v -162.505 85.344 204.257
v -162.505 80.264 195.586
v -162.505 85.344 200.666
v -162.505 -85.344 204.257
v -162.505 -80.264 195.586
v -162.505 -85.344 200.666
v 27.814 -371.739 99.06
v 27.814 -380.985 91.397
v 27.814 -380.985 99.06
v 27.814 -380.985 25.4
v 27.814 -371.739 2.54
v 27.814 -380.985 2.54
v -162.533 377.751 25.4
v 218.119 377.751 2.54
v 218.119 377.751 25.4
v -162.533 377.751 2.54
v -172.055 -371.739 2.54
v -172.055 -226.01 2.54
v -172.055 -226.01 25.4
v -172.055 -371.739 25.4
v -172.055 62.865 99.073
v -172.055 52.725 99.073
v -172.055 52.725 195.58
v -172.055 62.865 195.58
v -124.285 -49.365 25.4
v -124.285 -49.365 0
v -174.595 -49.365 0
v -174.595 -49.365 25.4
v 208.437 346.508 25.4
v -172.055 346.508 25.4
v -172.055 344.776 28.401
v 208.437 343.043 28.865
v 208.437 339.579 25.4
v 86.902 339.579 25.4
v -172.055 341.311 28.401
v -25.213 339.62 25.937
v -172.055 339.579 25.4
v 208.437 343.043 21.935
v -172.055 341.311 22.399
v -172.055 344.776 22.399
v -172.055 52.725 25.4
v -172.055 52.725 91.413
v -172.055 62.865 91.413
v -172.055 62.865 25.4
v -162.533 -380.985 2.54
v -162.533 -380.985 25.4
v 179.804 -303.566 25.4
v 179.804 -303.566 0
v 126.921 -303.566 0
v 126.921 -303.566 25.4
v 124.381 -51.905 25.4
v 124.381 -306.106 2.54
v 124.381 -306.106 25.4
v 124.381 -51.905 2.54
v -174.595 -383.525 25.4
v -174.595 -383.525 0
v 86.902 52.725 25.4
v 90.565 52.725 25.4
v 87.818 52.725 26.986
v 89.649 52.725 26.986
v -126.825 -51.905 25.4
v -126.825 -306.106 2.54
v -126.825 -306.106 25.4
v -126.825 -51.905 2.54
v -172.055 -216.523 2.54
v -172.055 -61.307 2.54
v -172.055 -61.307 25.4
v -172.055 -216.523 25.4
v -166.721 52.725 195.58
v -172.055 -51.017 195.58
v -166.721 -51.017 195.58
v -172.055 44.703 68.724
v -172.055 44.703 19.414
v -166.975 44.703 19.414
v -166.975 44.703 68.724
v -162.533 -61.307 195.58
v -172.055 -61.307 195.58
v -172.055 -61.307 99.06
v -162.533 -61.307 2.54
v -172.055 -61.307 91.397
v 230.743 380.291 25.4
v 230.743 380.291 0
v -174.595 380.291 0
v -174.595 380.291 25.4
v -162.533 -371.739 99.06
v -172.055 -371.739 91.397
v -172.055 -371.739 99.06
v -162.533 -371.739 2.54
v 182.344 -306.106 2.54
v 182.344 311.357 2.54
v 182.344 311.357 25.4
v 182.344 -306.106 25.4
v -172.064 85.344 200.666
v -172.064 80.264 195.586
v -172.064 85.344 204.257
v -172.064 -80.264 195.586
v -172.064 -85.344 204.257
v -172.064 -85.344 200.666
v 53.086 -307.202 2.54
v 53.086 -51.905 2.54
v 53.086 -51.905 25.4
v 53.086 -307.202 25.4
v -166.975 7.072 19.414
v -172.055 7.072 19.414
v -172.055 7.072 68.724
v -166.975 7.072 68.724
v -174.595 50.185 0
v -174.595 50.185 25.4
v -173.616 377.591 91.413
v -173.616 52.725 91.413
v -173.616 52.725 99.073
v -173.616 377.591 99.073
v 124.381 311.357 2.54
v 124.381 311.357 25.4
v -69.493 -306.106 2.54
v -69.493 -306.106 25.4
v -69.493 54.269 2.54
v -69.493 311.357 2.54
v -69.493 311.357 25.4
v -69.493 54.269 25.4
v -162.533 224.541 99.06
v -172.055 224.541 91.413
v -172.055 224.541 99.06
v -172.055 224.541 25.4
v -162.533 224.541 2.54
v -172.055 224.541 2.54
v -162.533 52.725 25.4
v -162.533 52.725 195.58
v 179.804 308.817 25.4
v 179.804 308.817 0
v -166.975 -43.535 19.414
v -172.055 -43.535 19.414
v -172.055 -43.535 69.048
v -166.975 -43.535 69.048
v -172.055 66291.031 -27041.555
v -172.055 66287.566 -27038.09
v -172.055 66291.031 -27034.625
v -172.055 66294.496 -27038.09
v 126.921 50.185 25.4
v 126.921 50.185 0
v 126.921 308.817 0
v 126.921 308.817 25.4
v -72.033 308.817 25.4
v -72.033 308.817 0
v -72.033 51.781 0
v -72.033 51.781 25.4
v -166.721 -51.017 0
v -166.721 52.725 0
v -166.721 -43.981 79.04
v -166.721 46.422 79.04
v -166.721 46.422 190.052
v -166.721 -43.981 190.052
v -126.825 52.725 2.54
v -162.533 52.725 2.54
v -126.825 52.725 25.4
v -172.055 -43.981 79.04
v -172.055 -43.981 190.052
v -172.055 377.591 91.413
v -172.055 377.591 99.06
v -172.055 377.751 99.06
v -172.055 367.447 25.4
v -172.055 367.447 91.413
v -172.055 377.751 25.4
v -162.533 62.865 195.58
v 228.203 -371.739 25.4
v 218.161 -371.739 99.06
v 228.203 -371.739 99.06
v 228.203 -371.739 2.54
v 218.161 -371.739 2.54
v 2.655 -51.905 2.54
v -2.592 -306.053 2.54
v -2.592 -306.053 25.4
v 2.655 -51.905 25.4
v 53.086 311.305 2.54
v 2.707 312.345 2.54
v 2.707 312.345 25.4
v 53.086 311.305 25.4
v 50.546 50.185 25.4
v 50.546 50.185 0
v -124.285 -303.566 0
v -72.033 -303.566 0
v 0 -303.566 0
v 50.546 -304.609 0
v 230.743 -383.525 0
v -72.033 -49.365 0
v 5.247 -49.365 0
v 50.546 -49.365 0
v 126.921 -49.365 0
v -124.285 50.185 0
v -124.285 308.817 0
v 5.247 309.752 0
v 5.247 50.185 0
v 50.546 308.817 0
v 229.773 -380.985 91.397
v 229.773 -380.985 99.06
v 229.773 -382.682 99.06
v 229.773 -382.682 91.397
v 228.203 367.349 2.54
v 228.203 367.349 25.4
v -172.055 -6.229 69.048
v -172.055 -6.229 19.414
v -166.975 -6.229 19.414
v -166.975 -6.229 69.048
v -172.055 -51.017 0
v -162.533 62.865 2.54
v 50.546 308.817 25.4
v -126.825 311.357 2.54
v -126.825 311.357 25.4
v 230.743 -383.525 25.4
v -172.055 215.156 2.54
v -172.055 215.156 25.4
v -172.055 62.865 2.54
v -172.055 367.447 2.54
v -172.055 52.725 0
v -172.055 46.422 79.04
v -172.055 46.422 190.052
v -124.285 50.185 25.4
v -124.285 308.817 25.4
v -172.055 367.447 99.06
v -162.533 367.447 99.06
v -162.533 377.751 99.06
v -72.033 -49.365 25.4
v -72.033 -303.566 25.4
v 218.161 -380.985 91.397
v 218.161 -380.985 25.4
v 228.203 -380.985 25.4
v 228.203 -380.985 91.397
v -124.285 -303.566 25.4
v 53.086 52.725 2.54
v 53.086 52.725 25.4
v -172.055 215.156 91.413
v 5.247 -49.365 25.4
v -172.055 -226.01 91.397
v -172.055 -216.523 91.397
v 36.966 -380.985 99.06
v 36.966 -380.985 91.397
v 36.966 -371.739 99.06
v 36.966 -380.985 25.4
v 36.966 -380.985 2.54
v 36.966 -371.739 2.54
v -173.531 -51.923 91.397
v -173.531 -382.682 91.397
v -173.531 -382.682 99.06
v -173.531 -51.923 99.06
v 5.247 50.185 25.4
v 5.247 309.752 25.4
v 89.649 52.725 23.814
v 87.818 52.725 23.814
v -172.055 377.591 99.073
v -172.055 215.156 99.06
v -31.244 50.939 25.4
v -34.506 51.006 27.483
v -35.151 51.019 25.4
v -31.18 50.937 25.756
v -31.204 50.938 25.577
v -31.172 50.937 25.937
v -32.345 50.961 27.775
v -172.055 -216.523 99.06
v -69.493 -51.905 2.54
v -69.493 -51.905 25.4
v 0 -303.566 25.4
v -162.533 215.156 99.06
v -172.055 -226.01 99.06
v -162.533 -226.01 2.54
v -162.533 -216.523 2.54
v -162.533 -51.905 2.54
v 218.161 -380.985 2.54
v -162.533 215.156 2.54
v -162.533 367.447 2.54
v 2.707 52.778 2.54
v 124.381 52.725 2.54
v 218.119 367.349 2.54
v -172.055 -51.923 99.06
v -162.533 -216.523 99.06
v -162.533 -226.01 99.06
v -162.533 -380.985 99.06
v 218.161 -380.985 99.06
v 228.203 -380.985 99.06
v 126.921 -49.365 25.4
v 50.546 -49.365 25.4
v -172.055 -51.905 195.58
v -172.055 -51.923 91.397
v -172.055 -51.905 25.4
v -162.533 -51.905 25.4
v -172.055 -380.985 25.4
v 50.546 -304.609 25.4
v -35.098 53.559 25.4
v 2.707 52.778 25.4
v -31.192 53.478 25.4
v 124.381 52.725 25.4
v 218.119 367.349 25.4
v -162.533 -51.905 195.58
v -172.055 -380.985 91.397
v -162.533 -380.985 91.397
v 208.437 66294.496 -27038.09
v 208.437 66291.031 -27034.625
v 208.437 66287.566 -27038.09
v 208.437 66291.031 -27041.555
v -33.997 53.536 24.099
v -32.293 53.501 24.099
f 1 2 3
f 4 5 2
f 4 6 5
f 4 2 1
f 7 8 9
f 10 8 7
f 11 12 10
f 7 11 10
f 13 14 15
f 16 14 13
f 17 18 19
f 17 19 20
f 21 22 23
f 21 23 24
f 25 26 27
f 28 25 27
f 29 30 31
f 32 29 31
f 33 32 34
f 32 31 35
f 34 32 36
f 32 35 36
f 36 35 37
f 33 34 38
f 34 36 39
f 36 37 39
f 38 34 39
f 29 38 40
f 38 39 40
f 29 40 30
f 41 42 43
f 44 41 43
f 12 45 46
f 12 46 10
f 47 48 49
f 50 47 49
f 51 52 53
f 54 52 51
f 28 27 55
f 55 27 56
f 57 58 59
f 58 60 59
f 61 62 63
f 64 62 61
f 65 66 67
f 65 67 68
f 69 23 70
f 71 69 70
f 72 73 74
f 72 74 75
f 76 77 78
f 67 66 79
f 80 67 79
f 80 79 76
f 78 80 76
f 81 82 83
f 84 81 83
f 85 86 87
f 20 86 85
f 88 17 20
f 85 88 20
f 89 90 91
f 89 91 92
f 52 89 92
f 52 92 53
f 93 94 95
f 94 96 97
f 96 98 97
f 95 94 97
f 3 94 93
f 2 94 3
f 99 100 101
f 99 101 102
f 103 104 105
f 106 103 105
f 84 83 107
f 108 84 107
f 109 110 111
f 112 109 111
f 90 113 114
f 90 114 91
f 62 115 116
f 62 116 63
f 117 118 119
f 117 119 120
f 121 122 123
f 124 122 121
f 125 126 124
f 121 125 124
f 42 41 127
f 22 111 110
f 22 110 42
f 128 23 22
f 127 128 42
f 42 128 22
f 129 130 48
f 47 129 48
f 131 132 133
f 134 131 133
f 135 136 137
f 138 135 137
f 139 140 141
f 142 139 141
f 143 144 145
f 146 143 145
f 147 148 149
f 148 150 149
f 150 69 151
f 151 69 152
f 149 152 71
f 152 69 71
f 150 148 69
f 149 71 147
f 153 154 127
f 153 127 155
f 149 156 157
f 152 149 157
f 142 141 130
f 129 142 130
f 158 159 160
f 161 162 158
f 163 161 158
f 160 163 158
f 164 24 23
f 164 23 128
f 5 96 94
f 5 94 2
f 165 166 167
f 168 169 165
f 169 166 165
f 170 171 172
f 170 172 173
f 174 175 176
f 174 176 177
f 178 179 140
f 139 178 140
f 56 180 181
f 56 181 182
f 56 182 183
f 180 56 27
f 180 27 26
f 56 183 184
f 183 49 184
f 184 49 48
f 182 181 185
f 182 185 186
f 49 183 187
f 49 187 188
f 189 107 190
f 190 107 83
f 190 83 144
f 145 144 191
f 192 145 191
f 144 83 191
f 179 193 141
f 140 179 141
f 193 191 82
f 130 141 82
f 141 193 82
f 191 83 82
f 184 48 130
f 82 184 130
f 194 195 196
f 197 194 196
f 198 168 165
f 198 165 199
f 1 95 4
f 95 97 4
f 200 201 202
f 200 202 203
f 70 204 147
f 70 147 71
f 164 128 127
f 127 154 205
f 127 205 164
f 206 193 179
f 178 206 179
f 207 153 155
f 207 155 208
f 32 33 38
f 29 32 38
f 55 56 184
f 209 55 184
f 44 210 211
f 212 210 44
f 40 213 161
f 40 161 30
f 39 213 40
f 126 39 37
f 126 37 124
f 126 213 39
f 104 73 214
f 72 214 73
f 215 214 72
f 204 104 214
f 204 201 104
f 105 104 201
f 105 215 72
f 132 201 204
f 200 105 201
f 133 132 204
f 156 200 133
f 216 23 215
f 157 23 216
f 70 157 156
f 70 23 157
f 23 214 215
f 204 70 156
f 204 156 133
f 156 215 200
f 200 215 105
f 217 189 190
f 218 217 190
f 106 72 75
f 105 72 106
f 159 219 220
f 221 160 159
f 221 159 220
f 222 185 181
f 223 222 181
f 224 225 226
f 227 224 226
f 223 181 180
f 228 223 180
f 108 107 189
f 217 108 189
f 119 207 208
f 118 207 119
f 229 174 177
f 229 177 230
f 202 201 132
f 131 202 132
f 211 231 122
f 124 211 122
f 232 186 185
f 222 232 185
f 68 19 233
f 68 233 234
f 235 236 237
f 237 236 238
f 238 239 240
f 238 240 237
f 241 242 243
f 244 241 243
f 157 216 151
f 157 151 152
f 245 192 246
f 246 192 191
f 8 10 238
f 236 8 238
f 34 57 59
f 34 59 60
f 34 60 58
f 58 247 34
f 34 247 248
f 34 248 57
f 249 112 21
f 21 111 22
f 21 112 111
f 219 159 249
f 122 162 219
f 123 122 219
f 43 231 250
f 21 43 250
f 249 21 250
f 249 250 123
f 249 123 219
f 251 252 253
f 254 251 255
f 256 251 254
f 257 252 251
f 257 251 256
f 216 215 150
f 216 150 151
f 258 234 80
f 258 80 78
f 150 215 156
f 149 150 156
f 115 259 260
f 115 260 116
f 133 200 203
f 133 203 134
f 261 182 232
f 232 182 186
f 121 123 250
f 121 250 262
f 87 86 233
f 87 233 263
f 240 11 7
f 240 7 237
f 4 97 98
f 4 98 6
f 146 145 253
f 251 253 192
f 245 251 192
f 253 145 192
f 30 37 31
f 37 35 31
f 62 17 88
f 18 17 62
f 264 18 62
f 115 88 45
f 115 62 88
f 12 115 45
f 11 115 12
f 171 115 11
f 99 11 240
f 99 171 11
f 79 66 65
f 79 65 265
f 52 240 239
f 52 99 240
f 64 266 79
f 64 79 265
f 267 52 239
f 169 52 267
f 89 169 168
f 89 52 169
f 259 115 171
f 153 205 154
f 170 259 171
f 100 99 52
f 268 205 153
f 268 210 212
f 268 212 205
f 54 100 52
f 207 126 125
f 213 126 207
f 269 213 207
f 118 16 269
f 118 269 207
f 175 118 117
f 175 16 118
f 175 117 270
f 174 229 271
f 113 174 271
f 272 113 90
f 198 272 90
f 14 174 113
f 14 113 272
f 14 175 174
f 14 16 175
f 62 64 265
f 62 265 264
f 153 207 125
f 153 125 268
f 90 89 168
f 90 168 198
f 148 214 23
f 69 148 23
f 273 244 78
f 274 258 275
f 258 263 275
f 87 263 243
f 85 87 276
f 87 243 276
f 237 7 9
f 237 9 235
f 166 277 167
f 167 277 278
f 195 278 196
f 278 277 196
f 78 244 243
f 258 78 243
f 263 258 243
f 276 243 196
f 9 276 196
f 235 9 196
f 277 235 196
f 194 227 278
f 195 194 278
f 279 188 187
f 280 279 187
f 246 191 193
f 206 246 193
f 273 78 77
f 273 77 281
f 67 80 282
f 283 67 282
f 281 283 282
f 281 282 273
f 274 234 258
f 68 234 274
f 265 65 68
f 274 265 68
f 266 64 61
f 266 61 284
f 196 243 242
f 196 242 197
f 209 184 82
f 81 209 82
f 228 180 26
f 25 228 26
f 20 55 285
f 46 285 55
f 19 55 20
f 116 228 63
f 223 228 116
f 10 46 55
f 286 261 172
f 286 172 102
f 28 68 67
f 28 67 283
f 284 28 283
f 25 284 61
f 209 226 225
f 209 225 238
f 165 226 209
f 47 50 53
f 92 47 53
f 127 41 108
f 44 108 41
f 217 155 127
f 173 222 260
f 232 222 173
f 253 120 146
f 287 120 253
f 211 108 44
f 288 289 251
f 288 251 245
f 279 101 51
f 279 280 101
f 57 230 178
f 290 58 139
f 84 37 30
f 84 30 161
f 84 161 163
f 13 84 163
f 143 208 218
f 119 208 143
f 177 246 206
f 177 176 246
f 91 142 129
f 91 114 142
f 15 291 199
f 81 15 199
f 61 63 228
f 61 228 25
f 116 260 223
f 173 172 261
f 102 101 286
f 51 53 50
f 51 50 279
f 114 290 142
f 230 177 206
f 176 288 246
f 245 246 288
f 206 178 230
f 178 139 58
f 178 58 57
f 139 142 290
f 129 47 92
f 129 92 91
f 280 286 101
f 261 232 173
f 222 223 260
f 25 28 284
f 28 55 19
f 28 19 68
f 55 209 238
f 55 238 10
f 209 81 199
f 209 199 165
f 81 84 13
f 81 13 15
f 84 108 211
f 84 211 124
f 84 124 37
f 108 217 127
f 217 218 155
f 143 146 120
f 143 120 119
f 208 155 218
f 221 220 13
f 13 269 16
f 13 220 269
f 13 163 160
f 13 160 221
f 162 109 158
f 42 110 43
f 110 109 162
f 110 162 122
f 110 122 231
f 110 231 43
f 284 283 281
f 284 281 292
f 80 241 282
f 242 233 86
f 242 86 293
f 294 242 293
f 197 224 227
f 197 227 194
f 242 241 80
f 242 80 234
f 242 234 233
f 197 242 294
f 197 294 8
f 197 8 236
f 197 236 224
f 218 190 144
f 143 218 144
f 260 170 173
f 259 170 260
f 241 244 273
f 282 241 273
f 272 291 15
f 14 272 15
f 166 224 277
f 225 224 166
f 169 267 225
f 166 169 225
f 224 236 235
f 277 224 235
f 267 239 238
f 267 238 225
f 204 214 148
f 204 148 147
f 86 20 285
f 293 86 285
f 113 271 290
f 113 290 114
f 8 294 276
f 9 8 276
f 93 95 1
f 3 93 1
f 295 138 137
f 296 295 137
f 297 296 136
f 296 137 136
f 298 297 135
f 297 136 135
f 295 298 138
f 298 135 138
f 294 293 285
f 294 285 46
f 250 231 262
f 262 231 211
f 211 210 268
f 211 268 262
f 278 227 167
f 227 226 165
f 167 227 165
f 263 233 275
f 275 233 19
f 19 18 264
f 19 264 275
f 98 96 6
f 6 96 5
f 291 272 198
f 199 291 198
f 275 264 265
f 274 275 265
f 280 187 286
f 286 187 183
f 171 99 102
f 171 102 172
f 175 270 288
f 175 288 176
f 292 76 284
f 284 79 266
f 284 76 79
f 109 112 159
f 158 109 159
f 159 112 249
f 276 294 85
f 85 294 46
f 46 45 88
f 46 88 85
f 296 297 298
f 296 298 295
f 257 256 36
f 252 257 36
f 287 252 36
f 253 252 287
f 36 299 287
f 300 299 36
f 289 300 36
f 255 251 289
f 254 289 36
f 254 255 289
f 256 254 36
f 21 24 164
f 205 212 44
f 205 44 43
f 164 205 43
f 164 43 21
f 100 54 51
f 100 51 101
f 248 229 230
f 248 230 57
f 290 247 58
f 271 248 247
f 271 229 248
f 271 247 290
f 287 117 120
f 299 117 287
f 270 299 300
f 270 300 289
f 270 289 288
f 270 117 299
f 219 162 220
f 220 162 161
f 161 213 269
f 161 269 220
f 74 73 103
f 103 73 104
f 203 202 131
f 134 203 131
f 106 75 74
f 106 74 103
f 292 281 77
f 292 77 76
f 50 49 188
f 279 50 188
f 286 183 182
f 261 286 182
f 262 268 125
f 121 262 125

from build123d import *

# Parameters (mm, degrees)
F1_DEPTH  = 25.4
F2_T      = -2.54
F3_W      = 9.5226986027
F3_H      = 10.3040856934
F3_H_2    = 9.245954237
F3_W_2    = 10.041333518
F4_DEPTH  = 96.52
F5_W      = 9.5226986027
F5_H      = 10.1391447401
F5_H_2    = 9.4019619441
F6_DEPTH  = 193.04
F7_W      = 9.5582157373
F7_H      = 8.6707919836
F9_DEPTH  = 85.344
F10_SIZE  = 5.08
F11_W     = 10.0838167286
F11_H     = 10.4020283642
F12_DEPTH = 22.86
F13_W     = 1.6963680973
F13_H     = 7.6626996374
F14_DEPTH = 401.828
F15_W     = 1.4758335733
F15_H     = 7.6626996374
F16_DEPTH = 330.7588
F17_W     = 1.560665884
F17_H     = 7.6605677605
F18_DEPTH = 324.866
F19_W     = 9.5226986027
F19_H     = 9.3857411835
F19_H_2   = 9.4867787715
F19_W_2   = 9.1516710818
F19_H_3   = 9.245954237
F20_DEPTH = 96.52
F21_W     = 103.7419562926
F21_H     = 195.58
F22_DEPTH = 5.334
F23_W     = 90.4028788209
F23_H     = 111.0128611326
F24_DEPTH = 7.366
F25_W     = 37.6309305429
F25_H     = 49.3094902486
F25_W_2   = 37.3065290041
F25_H_2   = 49.6338959783
F26_DEPTH = 5.08
F29_R     = 2.0259765458
F30_DEPTH = 291.592
F31_R     = 3.4647538712
F32_DEPTH = 380.492
F33_R     = 1.8315999193
F34_DEPTH = 290.322


# Not quite as in the source:
# - the program builds the solid bodies; features that only make, move or delete a surface that nothing else refers to are left out


with BuildPart() as f1:
    # F0 (on Top) → F1 (new body)
    with BuildSketch(Plane.XY):
        Polygon((-124.2847517133, -35.648856312), (-174.5952665806, -35.648856312), (-174.5952665806, -369.8091506958), (230.7426333427, -369.8091506958), (230.7426333427, 394.0069079399), (-174.5952665806, 394.0069079399), (-174.5952665806, 63.9014318585), (-124.2847517133, 63.9014318585), (-124.2847517133, 322.5328326225), (-72.0331966877, 322.5328326225), (-72.0331966877, 65.4967414162), (5.2474793047, 63.9014318585), (5.2474793047, 323.4679299602), (50.5458692184, 322.5328326225), (50.5458692184, 63.9014318585), (126.9210129976, 63.9014318585), (126.9210129976, 322.5328326225), (179.8037737608, 322.5328326225), (179.8037737608, -289.8495197296), (126.9210129976, -289.8495197296), (126.9210129976, -35.648856312), (50.5458692184, -35.648856312), (50.5458692184, -290.8929410925), (0, -289.8495197296), (5.2474793047, -35.648856312), (-72.0331966877, -35.648856312), (-72.0331966877, -289.8495197296), (-124.2847517133, -289.8495197296), align=None)
    extrude(amount=F1_DEPTH)

    # F2
    f2_openings = [f1.faces().sort_by_distance(p)[0] for p in [
        (-132.931796, -162.749188, 25.4),
    ]]
    offset(amount=F2_T, openings=f2_openings, kind=Kind.INTERSECTION)

    # F3 (on face) → F4 (join)
    with BuildSketch(Plane.XY.offset(2.54)):
        with Locations((-167.2939172792, 386.3148650932)):
            Rectangle(F3_W, F3_H)
        with Locations((-167.2939172792, -362.6461735773)):
            Rectangle(F3_W, F3_H_2)
        with Locations((223.1819665837, -362.6461735773)):
            Rectangle(F3_W_2, F3_H_2)
    extrude(amount=F4_DEPTH)

    # F5 (on face) → F6 (join)
    with BuildSketch(Plane.XY.offset(2.54)):
        with Locations((-167.2939172792, 71.5110042286)):
            Rectangle(F5_W, F5_H)
        with Locations((-167.2939172792, -42.8898372841)):
            Rectangle(F5_W, F5_H_2)
    extrude(amount=F6_DEPTH)


with BuildPart() as f1_1:
    # F8: moved
    add(f1.part.moved(Location((0, -13.716, 0))))

    # F11 (on face) → F12 (join)
    with BuildSketch(Plane.XY.offset(2.54)):
        with Locations((223.1607249784, 372.5498937578)):
            Rectangle(F11_W, F11_H)
    extrude(amount=F12_DEPTH)

    # F13 (on face) → F14 (join)
    with BuildSketch(Plane(origin=(-172.0552665806, 0, 0), x_dir=(0, -1, 0), z_dir=(-1, 0, 0))):
        with Locations((381.8333347445, 95.2286501813)):
            Rectangle(F13_W, F13_H)
    extrude(amount=-F14_DEPTH)

    # F15 (on face) → F16 (join)
    with BuildSketch(Plane.XZ.offset(382.6815187931)):
        with Locations((-172.7931833673, 95.2286501813)):
            Rectangle(F15_W, F15_H)
    extrude(amount=-F16_DEPTH)

    # F17 (on face) → F18 (join)
    with BuildSketch(Plane.XZ.offset(-52.7254318585)):
        with Locations((-172.8355995226, 95.2429324389)):
            Rectangle(F17_W, F17_H)
    extrude(amount=-F18_DEPTH)

    # F19 (on face) → F20 (join)
    with BuildSketch(Plane.XY.offset(2.54)):
        with Locations((-167.2939172792, 219.8485700144)):
            Rectangle(F19_W, F19_H)
        with Locations((-167.2939172792, -221.2663967432)):
            Rectangle(F19_W, F19_H_2)
        with Locations((32.3902014643, -376.3621735773)):
            Rectangle(F19_W_2, F19_H_3)
    extrude(amount=F20_DEPTH)

    # F29 (on face) → F30 (join)
    with BuildSketch(Plane(origin=(1.0377747393, 50.2723330385, 0), x_dir=(0.9997870001, -0.0206386621, 0), z_dir=(-0.0206386621, -0.9997870001, 0))):
        with Locations((-34.2426486313, 25.9369704872)):
            Circle(F29_R)
    extrude(amount=-F30_DEPTH)

    # F31 (on face) → F32 (join)
    with BuildSketch(Plane.YZ.offset(-172.0552665806)):
        with Locations((343.0432975292, 25.4)):
            Circle(F31_R)
    extrude(amount=F32_DEPTH)

    # F33 (on face) → F34 (join)
    with BuildSketch(Plane(origin=(0, 52.7254318585, 0), x_dir=(-1, 0, 0), z_dir=(0, 1, 0))):
        with Locations((-88.733441108, 25.4)):
            Circle(F33_R)
    extrude(amount=F34_DEPTH)


with BuildPart() as f9:
    # F7 (on Front) → F9 (new body, symmetric)
    with BuildSketch(Plane.XZ):
        with Locations((-167.2844663262, 199.9216154218)):
            Rectangle(F7_W, F7_H)
    extrude(amount=F9_DEPTH, both=True)

    # F10
    f10_edges = [f9.edges().sort_by_distance(p)[0] for p in [
        (-167.284466, 85.344, 195.586219),
        (-167.284466, -85.344, 195.586219),
    ]]
    chamfer(f10_edges, length=F10_SIZE)


with BuildPart() as f22:
    # F21 (on face) → F22 (new body)
    with BuildSketch(Plane(origin=(-172.0552665806, 0, 0), x_dir=(0, -1, 0), z_dir=(-1, 0, 0))):
        with Locations((-0.8544537122, 97.79)):
            Rectangle(F21_W, F21_H)
    extrude(amount=-F22_DEPTH)

    # F23 (on face) → F24 (cut)
    with BuildSketch(Plane(origin=(-172.0552665806, 0, 0), x_dir=(0, -1, 0), z_dir=(-1, 0, 0))):
        with Locations((-1.2207254767, 134.5460042357)):
            Rectangle(F23_W, F23_H)
    extrude(amount=-F24_DEPTH, mode=Mode.SUBTRACT)

    # F25 (on face) → F26 (cut)
    with BuildSketch(Plane(origin=(-172.0552665806, 0, 0), x_dir=(0, -1, 0), z_dir=(-1, 0, 0))):
        with Locations((-25.8872956038, 44.0689856187)):
            Rectangle(F25_W, F25_H)
        with Locations((24.8820164707, 44.2311884835)):
            Rectangle(F25_W_2, F25_H_2)
    extrude(amount=-F26_DEPTH, mode=Mode.SUBTRACT)


with BuildPart() as f32:
    # F31 (on face) → F32, piece 2 (new body)
    with BuildSketch(Plane.YZ.offset(-172.0552665806)):
        with Locations((66291.0308837891, -27038.0897521973)):
            Circle(F31_R)
    extrude(amount=F32_DEPTH)


solid = Compound([f1_1.part, f9.part, f22.part, f32.part])
